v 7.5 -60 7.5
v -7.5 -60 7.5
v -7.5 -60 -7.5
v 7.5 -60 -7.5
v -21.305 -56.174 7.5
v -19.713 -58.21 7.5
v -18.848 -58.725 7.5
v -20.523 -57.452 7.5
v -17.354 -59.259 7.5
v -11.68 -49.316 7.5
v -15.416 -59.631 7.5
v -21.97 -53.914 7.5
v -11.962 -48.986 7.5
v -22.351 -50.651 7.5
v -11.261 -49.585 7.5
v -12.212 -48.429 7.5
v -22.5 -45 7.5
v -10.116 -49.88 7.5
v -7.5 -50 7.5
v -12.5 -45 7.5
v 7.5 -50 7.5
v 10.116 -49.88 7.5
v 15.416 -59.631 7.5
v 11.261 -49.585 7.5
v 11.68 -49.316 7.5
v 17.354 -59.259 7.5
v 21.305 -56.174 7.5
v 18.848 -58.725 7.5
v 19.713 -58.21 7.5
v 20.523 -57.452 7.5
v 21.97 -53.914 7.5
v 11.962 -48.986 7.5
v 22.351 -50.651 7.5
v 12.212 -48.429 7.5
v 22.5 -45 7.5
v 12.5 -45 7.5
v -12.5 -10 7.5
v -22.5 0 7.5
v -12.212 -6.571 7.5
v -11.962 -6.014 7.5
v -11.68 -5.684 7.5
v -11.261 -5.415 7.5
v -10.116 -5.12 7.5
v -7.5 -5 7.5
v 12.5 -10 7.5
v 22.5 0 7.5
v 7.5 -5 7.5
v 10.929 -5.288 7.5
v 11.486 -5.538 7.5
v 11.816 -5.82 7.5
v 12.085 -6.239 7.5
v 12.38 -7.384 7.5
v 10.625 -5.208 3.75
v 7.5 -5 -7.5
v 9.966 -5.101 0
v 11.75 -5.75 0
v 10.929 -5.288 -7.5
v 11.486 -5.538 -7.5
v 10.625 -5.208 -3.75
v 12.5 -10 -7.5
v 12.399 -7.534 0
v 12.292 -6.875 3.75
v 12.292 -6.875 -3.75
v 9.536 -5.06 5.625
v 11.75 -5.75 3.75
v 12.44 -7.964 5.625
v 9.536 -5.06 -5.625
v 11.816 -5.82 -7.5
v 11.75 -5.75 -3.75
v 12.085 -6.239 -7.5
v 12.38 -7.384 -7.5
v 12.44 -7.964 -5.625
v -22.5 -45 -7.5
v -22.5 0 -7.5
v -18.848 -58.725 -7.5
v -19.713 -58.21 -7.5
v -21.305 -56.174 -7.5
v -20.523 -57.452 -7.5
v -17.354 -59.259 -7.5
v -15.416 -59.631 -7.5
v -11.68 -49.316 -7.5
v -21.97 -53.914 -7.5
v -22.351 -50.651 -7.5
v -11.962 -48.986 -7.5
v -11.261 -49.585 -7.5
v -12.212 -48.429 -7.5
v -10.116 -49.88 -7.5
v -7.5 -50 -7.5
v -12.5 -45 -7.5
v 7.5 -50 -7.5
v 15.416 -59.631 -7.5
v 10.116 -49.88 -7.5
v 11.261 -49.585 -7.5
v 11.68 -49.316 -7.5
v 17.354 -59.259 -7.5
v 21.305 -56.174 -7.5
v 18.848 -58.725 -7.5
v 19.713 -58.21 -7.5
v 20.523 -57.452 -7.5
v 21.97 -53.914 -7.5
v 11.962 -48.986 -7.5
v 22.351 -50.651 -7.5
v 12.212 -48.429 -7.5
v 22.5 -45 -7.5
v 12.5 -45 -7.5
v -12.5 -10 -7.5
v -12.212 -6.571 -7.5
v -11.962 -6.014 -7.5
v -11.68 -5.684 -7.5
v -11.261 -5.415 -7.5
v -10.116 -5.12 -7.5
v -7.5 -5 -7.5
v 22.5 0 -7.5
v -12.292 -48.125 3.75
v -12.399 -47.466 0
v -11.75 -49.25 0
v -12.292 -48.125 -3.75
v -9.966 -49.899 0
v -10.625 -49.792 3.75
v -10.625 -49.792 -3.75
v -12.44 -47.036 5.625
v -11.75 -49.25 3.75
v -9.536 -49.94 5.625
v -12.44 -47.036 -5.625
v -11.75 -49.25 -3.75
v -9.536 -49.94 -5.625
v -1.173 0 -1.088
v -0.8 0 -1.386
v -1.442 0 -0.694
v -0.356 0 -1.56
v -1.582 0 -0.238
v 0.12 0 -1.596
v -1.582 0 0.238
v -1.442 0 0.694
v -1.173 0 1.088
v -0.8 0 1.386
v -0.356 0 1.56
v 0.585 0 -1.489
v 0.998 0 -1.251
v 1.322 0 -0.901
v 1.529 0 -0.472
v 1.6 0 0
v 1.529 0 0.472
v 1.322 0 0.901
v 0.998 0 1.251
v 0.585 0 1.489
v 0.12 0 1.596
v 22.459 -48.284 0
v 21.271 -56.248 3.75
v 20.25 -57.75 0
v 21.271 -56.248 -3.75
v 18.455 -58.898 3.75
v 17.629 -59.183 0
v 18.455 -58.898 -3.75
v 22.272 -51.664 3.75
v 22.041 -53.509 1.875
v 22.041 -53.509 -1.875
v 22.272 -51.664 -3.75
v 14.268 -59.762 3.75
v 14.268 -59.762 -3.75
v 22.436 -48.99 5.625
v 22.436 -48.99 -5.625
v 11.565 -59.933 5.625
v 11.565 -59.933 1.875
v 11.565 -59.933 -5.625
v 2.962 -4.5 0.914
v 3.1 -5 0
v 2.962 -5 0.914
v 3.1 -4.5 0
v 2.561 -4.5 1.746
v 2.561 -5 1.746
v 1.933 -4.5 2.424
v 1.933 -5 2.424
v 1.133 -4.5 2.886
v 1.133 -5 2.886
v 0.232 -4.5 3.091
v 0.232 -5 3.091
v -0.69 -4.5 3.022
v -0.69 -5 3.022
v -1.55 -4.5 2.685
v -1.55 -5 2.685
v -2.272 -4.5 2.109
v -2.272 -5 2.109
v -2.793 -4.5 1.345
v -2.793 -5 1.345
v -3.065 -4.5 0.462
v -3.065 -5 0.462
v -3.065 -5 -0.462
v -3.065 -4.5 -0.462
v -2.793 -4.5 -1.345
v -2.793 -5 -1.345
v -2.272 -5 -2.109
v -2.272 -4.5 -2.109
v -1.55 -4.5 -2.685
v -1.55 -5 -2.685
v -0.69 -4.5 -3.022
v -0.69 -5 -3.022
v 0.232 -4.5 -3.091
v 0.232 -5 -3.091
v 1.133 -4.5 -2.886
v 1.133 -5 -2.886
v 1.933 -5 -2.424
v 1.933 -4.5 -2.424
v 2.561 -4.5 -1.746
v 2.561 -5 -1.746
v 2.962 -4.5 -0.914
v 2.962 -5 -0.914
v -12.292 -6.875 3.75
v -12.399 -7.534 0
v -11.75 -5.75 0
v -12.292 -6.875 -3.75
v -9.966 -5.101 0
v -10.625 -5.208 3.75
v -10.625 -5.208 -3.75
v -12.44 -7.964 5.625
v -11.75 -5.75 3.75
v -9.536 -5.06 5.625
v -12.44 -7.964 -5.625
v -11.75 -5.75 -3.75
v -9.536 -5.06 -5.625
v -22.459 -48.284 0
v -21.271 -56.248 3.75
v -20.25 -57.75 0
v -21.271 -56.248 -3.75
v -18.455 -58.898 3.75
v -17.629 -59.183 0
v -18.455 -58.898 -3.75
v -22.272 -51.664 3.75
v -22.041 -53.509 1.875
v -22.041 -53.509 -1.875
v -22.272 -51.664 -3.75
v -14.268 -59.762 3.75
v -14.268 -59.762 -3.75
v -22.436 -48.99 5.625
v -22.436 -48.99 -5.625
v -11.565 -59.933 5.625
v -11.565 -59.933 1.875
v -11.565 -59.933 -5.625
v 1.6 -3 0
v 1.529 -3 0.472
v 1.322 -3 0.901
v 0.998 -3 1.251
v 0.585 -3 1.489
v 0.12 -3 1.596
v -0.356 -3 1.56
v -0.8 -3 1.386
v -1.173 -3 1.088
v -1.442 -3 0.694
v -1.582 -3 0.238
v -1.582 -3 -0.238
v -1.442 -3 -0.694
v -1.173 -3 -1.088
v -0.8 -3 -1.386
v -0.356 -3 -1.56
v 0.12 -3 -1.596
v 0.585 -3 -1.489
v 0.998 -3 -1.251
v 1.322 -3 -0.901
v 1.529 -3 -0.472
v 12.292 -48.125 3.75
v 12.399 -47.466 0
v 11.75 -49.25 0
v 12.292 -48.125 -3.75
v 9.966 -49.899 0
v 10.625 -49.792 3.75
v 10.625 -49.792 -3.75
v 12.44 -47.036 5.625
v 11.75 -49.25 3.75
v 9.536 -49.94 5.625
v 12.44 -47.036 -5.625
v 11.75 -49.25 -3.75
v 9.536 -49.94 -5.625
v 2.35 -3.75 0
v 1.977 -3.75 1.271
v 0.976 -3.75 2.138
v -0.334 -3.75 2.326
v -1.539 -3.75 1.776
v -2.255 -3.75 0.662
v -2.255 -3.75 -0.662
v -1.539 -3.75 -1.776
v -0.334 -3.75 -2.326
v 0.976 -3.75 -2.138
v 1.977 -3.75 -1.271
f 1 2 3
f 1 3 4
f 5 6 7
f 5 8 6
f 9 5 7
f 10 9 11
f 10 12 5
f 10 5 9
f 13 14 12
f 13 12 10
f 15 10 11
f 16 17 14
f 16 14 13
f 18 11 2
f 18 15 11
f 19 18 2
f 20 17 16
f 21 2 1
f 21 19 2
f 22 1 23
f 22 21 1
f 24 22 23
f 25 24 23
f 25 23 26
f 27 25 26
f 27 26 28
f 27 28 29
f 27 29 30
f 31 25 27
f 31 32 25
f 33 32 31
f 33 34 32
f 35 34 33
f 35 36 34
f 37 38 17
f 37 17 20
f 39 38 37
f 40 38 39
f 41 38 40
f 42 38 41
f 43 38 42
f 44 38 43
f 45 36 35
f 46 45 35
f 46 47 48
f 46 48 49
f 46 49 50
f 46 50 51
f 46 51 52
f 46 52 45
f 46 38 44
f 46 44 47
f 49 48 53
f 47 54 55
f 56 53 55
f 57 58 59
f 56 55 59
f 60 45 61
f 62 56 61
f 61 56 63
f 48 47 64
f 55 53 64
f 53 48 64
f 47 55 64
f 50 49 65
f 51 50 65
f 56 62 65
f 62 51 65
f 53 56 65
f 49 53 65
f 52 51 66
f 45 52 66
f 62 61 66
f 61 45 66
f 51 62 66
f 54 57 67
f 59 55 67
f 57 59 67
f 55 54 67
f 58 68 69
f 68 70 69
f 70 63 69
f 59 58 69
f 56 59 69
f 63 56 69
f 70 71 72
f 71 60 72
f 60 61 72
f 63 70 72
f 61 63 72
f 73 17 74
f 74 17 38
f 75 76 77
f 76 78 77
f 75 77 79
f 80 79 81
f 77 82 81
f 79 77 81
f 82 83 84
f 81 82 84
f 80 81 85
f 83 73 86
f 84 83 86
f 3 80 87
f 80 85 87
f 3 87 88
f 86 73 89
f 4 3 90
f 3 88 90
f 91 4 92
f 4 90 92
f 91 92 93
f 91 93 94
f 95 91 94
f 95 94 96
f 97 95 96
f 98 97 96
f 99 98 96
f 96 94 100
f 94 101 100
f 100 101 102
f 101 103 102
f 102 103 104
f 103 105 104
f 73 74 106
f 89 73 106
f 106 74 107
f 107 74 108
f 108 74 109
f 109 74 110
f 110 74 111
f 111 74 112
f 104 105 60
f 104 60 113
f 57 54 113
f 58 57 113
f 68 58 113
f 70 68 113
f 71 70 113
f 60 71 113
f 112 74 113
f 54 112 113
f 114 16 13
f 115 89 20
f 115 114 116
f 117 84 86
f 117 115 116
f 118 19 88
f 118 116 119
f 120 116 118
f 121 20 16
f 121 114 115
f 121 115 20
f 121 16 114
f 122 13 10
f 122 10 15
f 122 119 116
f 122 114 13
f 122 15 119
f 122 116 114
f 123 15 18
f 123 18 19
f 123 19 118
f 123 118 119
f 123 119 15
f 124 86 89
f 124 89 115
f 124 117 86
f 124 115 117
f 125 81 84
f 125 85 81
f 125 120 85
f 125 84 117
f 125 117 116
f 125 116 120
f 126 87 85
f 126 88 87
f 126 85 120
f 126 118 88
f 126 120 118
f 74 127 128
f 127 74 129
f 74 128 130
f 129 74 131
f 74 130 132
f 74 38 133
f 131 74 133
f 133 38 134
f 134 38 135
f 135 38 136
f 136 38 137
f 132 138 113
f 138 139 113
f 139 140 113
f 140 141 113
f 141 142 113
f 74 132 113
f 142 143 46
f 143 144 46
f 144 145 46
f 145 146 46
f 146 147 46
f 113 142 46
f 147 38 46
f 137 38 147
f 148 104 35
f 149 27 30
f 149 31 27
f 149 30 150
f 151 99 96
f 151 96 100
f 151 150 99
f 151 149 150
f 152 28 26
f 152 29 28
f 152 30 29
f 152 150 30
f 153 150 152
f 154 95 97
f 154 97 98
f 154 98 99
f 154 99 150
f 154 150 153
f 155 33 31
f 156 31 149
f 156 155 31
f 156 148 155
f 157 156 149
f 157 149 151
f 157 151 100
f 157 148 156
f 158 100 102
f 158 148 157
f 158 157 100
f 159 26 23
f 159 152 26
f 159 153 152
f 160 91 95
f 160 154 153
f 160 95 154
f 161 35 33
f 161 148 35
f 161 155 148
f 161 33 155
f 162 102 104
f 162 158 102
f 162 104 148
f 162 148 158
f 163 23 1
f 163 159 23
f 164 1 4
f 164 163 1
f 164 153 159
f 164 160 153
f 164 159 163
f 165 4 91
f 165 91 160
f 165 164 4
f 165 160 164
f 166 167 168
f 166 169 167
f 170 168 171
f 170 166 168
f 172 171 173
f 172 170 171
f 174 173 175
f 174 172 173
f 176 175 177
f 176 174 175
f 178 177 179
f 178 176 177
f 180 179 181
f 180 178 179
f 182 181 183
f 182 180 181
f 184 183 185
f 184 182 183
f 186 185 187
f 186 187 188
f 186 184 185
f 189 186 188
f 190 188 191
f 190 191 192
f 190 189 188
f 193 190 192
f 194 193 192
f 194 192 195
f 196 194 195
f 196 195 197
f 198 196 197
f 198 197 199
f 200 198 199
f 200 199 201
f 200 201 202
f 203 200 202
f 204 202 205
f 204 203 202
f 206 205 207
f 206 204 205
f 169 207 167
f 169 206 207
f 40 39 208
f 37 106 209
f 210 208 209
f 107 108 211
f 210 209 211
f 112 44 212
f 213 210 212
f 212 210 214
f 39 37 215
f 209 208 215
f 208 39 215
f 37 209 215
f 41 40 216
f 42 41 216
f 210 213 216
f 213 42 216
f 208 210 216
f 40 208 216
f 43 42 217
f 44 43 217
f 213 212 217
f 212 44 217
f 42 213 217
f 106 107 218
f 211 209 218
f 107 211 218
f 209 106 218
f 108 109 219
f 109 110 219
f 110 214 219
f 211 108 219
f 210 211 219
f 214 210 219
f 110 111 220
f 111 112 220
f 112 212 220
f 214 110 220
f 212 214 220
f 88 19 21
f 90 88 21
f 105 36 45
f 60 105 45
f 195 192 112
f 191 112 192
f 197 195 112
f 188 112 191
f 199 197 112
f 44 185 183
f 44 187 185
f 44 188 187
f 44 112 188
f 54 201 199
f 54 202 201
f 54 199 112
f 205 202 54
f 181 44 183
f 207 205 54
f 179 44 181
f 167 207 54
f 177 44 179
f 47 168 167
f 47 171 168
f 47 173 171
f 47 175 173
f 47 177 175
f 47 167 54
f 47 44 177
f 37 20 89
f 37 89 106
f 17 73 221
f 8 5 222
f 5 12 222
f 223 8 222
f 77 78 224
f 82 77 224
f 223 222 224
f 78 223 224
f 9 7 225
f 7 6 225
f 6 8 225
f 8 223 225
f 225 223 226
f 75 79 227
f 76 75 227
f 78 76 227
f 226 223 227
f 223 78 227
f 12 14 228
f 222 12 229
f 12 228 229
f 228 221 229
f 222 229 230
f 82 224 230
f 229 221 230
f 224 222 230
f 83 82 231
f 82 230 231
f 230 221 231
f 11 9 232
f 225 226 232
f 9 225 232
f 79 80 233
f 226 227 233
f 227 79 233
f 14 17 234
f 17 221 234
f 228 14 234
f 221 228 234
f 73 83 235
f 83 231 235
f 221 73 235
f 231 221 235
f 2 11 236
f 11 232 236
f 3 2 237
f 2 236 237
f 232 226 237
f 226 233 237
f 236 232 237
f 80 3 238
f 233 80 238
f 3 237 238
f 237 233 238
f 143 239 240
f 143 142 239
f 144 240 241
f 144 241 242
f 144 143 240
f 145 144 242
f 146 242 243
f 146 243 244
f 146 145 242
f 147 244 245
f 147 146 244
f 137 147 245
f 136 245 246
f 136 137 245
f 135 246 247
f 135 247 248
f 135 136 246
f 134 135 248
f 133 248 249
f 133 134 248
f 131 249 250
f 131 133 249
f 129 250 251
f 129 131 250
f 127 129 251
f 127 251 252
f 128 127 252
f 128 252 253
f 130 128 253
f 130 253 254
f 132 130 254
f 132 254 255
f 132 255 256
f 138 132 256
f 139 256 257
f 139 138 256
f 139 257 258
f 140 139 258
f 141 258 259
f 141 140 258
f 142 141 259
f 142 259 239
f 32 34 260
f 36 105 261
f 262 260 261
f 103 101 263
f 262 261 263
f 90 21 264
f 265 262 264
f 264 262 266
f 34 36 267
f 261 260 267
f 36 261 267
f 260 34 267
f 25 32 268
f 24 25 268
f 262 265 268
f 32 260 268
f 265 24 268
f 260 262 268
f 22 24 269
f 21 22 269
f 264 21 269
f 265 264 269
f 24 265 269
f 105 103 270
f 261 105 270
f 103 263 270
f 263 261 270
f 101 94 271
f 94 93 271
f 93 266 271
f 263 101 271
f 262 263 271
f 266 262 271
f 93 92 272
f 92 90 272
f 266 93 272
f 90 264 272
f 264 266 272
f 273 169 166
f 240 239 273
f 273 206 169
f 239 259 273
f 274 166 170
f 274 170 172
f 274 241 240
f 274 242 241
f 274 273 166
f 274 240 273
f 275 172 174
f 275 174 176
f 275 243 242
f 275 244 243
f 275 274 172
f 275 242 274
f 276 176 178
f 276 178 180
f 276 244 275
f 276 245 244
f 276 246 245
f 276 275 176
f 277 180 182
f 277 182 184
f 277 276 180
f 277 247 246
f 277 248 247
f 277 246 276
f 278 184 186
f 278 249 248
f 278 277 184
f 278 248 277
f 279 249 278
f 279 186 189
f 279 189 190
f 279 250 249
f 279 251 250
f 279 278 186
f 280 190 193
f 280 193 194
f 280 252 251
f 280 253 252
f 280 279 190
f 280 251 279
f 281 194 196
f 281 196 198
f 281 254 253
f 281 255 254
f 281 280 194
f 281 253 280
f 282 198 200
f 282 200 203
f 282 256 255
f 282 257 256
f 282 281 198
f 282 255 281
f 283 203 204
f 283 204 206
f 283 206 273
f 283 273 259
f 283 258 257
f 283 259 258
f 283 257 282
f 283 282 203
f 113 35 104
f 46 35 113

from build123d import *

# Parameters (mm, degrees)
F0_W        = 45
F0_H        = 60
F0_W_2      = 25
F0_H_2      = 45
F1_DEPTH    = 7.5
F4_T1_DEPTH = 15
F5_T1_DEPTH = 90


# Not quite as in the source:
# - a fillet or chamfer that OpenCascade refuses, or shapes differently, is made with other operations: its cross-section is extruded or revolved along the edge and cut away or added


with BuildPart() as f1:
    # F0 (on Top) → F1 (new body, symmetric)
    with BuildSketch(Plane.XY):
        with Locations((0, -30)):
            Rectangle(F0_W, F0_H)
        with Locations((0, -27.5)):
            Rectangle(F0_W_2, F0_H_2, mode=Mode.SUBTRACT)
    extrude(amount=F1_DEPTH, both=True)

    # F2 (on Top) → F3 (revolve, cut)
    with BuildSketch(Plane.XY):
        Polygon((1.6, 0), (0, 0), (0, -5), (3.1, -5), (3.1, -4.5), (1.6, -3), align=None)
    revolve(axis=Axis((0, -2.5, 0), (0, -1, 0)), mode=Mode.SUBTRACT)

    # F4: fillet of radius 5 on 4 edges, made by hand

    # F4_s2 → F4_t1 (join)
    with BuildSketch(Plane.XY.offset(-7.5)):
        with BuildLine():
            add(Edge.make_bspline(
                [(-12.5, -10), (-12.5, -5), (-7.5, -5)],
                knots=[0, 0, 0, 1, 1, 1], degree=2, weights=[1, 2.3333333333, 1]))
            Line((-7.5, -5), (-12.5, -5))
            Line((-12.5, -5), (-12.5, -10))
        make_face()
        with BuildLine():
            add(Edge.make_bspline(
                [(7.5, -5), (12.5, -5), (12.5, -10)],
                knots=[0, 0, 0, 1, 1, 1], degree=2, weights=[1, 2.3333333333, 1]))
            Line((12.5, -10), (12.5, -5))
            Line((12.5, -5), (7.5, -5))
        make_face()
        with BuildLine():
            add(Edge.make_bspline(
                [(-12.5, -45), (-12.5, -50), (-7.5, -50)],
                knots=[0, 0, 0, 1, 1, 1], degree=2, weights=[1, 2.3333333333, 1]))
            Line((-7.5, -50), (-12.5, -50))
            Line((-12.5, -50), (-12.5, -45))
        make_face()
        with BuildLine():
            add(Edge.make_bspline(
                [(12.5, -45), (12.5, -50), (7.5, -50)],
                knots=[0, 0, 0, 1, 1, 1], degree=2, weights=[1, 2.3333333333, 1]))
            Line((7.5, -50), (12.5, -50))
            Line((12.5, -50), (12.5, -45))
        make_face()
    extrude(amount=F4_T1_DEPTH)

    # F5: fillet of radius 15 on 2 edges, made by hand

    # F5_s2 → F5_t1 (cut)
    with BuildSketch(Plane.XY.offset(-45)):
        with BuildLine():
            add(Edge.make_bspline(
                [(-22.5, -45), (-22.5, -60), (-7.5, -60)],
                knots=[0, 0, 0, 1, 1, 1], degree=2, weights=[1, 2.3333333333, 1]))
            Line((-7.5, -60), (-22.5, -60))
            Line((-22.5, -60), (-22.5, -45))
        make_face()
        with BuildLine():
            add(Edge.make_bspline(
                [(22.5, -45), (22.5, -60), (7.5, -60)],
                knots=[0, 0, 0, 1, 1, 1], degree=2, weights=[1, 2.3333333333, 1]))
            Line((7.5, -60), (22.5, -60))
            Line((22.5, -60), (22.5, -45))
        make_face()
    extrude(amount=F5_T1_DEPTH, mode=Mode.SUBTRACT)


solid = f1.part
